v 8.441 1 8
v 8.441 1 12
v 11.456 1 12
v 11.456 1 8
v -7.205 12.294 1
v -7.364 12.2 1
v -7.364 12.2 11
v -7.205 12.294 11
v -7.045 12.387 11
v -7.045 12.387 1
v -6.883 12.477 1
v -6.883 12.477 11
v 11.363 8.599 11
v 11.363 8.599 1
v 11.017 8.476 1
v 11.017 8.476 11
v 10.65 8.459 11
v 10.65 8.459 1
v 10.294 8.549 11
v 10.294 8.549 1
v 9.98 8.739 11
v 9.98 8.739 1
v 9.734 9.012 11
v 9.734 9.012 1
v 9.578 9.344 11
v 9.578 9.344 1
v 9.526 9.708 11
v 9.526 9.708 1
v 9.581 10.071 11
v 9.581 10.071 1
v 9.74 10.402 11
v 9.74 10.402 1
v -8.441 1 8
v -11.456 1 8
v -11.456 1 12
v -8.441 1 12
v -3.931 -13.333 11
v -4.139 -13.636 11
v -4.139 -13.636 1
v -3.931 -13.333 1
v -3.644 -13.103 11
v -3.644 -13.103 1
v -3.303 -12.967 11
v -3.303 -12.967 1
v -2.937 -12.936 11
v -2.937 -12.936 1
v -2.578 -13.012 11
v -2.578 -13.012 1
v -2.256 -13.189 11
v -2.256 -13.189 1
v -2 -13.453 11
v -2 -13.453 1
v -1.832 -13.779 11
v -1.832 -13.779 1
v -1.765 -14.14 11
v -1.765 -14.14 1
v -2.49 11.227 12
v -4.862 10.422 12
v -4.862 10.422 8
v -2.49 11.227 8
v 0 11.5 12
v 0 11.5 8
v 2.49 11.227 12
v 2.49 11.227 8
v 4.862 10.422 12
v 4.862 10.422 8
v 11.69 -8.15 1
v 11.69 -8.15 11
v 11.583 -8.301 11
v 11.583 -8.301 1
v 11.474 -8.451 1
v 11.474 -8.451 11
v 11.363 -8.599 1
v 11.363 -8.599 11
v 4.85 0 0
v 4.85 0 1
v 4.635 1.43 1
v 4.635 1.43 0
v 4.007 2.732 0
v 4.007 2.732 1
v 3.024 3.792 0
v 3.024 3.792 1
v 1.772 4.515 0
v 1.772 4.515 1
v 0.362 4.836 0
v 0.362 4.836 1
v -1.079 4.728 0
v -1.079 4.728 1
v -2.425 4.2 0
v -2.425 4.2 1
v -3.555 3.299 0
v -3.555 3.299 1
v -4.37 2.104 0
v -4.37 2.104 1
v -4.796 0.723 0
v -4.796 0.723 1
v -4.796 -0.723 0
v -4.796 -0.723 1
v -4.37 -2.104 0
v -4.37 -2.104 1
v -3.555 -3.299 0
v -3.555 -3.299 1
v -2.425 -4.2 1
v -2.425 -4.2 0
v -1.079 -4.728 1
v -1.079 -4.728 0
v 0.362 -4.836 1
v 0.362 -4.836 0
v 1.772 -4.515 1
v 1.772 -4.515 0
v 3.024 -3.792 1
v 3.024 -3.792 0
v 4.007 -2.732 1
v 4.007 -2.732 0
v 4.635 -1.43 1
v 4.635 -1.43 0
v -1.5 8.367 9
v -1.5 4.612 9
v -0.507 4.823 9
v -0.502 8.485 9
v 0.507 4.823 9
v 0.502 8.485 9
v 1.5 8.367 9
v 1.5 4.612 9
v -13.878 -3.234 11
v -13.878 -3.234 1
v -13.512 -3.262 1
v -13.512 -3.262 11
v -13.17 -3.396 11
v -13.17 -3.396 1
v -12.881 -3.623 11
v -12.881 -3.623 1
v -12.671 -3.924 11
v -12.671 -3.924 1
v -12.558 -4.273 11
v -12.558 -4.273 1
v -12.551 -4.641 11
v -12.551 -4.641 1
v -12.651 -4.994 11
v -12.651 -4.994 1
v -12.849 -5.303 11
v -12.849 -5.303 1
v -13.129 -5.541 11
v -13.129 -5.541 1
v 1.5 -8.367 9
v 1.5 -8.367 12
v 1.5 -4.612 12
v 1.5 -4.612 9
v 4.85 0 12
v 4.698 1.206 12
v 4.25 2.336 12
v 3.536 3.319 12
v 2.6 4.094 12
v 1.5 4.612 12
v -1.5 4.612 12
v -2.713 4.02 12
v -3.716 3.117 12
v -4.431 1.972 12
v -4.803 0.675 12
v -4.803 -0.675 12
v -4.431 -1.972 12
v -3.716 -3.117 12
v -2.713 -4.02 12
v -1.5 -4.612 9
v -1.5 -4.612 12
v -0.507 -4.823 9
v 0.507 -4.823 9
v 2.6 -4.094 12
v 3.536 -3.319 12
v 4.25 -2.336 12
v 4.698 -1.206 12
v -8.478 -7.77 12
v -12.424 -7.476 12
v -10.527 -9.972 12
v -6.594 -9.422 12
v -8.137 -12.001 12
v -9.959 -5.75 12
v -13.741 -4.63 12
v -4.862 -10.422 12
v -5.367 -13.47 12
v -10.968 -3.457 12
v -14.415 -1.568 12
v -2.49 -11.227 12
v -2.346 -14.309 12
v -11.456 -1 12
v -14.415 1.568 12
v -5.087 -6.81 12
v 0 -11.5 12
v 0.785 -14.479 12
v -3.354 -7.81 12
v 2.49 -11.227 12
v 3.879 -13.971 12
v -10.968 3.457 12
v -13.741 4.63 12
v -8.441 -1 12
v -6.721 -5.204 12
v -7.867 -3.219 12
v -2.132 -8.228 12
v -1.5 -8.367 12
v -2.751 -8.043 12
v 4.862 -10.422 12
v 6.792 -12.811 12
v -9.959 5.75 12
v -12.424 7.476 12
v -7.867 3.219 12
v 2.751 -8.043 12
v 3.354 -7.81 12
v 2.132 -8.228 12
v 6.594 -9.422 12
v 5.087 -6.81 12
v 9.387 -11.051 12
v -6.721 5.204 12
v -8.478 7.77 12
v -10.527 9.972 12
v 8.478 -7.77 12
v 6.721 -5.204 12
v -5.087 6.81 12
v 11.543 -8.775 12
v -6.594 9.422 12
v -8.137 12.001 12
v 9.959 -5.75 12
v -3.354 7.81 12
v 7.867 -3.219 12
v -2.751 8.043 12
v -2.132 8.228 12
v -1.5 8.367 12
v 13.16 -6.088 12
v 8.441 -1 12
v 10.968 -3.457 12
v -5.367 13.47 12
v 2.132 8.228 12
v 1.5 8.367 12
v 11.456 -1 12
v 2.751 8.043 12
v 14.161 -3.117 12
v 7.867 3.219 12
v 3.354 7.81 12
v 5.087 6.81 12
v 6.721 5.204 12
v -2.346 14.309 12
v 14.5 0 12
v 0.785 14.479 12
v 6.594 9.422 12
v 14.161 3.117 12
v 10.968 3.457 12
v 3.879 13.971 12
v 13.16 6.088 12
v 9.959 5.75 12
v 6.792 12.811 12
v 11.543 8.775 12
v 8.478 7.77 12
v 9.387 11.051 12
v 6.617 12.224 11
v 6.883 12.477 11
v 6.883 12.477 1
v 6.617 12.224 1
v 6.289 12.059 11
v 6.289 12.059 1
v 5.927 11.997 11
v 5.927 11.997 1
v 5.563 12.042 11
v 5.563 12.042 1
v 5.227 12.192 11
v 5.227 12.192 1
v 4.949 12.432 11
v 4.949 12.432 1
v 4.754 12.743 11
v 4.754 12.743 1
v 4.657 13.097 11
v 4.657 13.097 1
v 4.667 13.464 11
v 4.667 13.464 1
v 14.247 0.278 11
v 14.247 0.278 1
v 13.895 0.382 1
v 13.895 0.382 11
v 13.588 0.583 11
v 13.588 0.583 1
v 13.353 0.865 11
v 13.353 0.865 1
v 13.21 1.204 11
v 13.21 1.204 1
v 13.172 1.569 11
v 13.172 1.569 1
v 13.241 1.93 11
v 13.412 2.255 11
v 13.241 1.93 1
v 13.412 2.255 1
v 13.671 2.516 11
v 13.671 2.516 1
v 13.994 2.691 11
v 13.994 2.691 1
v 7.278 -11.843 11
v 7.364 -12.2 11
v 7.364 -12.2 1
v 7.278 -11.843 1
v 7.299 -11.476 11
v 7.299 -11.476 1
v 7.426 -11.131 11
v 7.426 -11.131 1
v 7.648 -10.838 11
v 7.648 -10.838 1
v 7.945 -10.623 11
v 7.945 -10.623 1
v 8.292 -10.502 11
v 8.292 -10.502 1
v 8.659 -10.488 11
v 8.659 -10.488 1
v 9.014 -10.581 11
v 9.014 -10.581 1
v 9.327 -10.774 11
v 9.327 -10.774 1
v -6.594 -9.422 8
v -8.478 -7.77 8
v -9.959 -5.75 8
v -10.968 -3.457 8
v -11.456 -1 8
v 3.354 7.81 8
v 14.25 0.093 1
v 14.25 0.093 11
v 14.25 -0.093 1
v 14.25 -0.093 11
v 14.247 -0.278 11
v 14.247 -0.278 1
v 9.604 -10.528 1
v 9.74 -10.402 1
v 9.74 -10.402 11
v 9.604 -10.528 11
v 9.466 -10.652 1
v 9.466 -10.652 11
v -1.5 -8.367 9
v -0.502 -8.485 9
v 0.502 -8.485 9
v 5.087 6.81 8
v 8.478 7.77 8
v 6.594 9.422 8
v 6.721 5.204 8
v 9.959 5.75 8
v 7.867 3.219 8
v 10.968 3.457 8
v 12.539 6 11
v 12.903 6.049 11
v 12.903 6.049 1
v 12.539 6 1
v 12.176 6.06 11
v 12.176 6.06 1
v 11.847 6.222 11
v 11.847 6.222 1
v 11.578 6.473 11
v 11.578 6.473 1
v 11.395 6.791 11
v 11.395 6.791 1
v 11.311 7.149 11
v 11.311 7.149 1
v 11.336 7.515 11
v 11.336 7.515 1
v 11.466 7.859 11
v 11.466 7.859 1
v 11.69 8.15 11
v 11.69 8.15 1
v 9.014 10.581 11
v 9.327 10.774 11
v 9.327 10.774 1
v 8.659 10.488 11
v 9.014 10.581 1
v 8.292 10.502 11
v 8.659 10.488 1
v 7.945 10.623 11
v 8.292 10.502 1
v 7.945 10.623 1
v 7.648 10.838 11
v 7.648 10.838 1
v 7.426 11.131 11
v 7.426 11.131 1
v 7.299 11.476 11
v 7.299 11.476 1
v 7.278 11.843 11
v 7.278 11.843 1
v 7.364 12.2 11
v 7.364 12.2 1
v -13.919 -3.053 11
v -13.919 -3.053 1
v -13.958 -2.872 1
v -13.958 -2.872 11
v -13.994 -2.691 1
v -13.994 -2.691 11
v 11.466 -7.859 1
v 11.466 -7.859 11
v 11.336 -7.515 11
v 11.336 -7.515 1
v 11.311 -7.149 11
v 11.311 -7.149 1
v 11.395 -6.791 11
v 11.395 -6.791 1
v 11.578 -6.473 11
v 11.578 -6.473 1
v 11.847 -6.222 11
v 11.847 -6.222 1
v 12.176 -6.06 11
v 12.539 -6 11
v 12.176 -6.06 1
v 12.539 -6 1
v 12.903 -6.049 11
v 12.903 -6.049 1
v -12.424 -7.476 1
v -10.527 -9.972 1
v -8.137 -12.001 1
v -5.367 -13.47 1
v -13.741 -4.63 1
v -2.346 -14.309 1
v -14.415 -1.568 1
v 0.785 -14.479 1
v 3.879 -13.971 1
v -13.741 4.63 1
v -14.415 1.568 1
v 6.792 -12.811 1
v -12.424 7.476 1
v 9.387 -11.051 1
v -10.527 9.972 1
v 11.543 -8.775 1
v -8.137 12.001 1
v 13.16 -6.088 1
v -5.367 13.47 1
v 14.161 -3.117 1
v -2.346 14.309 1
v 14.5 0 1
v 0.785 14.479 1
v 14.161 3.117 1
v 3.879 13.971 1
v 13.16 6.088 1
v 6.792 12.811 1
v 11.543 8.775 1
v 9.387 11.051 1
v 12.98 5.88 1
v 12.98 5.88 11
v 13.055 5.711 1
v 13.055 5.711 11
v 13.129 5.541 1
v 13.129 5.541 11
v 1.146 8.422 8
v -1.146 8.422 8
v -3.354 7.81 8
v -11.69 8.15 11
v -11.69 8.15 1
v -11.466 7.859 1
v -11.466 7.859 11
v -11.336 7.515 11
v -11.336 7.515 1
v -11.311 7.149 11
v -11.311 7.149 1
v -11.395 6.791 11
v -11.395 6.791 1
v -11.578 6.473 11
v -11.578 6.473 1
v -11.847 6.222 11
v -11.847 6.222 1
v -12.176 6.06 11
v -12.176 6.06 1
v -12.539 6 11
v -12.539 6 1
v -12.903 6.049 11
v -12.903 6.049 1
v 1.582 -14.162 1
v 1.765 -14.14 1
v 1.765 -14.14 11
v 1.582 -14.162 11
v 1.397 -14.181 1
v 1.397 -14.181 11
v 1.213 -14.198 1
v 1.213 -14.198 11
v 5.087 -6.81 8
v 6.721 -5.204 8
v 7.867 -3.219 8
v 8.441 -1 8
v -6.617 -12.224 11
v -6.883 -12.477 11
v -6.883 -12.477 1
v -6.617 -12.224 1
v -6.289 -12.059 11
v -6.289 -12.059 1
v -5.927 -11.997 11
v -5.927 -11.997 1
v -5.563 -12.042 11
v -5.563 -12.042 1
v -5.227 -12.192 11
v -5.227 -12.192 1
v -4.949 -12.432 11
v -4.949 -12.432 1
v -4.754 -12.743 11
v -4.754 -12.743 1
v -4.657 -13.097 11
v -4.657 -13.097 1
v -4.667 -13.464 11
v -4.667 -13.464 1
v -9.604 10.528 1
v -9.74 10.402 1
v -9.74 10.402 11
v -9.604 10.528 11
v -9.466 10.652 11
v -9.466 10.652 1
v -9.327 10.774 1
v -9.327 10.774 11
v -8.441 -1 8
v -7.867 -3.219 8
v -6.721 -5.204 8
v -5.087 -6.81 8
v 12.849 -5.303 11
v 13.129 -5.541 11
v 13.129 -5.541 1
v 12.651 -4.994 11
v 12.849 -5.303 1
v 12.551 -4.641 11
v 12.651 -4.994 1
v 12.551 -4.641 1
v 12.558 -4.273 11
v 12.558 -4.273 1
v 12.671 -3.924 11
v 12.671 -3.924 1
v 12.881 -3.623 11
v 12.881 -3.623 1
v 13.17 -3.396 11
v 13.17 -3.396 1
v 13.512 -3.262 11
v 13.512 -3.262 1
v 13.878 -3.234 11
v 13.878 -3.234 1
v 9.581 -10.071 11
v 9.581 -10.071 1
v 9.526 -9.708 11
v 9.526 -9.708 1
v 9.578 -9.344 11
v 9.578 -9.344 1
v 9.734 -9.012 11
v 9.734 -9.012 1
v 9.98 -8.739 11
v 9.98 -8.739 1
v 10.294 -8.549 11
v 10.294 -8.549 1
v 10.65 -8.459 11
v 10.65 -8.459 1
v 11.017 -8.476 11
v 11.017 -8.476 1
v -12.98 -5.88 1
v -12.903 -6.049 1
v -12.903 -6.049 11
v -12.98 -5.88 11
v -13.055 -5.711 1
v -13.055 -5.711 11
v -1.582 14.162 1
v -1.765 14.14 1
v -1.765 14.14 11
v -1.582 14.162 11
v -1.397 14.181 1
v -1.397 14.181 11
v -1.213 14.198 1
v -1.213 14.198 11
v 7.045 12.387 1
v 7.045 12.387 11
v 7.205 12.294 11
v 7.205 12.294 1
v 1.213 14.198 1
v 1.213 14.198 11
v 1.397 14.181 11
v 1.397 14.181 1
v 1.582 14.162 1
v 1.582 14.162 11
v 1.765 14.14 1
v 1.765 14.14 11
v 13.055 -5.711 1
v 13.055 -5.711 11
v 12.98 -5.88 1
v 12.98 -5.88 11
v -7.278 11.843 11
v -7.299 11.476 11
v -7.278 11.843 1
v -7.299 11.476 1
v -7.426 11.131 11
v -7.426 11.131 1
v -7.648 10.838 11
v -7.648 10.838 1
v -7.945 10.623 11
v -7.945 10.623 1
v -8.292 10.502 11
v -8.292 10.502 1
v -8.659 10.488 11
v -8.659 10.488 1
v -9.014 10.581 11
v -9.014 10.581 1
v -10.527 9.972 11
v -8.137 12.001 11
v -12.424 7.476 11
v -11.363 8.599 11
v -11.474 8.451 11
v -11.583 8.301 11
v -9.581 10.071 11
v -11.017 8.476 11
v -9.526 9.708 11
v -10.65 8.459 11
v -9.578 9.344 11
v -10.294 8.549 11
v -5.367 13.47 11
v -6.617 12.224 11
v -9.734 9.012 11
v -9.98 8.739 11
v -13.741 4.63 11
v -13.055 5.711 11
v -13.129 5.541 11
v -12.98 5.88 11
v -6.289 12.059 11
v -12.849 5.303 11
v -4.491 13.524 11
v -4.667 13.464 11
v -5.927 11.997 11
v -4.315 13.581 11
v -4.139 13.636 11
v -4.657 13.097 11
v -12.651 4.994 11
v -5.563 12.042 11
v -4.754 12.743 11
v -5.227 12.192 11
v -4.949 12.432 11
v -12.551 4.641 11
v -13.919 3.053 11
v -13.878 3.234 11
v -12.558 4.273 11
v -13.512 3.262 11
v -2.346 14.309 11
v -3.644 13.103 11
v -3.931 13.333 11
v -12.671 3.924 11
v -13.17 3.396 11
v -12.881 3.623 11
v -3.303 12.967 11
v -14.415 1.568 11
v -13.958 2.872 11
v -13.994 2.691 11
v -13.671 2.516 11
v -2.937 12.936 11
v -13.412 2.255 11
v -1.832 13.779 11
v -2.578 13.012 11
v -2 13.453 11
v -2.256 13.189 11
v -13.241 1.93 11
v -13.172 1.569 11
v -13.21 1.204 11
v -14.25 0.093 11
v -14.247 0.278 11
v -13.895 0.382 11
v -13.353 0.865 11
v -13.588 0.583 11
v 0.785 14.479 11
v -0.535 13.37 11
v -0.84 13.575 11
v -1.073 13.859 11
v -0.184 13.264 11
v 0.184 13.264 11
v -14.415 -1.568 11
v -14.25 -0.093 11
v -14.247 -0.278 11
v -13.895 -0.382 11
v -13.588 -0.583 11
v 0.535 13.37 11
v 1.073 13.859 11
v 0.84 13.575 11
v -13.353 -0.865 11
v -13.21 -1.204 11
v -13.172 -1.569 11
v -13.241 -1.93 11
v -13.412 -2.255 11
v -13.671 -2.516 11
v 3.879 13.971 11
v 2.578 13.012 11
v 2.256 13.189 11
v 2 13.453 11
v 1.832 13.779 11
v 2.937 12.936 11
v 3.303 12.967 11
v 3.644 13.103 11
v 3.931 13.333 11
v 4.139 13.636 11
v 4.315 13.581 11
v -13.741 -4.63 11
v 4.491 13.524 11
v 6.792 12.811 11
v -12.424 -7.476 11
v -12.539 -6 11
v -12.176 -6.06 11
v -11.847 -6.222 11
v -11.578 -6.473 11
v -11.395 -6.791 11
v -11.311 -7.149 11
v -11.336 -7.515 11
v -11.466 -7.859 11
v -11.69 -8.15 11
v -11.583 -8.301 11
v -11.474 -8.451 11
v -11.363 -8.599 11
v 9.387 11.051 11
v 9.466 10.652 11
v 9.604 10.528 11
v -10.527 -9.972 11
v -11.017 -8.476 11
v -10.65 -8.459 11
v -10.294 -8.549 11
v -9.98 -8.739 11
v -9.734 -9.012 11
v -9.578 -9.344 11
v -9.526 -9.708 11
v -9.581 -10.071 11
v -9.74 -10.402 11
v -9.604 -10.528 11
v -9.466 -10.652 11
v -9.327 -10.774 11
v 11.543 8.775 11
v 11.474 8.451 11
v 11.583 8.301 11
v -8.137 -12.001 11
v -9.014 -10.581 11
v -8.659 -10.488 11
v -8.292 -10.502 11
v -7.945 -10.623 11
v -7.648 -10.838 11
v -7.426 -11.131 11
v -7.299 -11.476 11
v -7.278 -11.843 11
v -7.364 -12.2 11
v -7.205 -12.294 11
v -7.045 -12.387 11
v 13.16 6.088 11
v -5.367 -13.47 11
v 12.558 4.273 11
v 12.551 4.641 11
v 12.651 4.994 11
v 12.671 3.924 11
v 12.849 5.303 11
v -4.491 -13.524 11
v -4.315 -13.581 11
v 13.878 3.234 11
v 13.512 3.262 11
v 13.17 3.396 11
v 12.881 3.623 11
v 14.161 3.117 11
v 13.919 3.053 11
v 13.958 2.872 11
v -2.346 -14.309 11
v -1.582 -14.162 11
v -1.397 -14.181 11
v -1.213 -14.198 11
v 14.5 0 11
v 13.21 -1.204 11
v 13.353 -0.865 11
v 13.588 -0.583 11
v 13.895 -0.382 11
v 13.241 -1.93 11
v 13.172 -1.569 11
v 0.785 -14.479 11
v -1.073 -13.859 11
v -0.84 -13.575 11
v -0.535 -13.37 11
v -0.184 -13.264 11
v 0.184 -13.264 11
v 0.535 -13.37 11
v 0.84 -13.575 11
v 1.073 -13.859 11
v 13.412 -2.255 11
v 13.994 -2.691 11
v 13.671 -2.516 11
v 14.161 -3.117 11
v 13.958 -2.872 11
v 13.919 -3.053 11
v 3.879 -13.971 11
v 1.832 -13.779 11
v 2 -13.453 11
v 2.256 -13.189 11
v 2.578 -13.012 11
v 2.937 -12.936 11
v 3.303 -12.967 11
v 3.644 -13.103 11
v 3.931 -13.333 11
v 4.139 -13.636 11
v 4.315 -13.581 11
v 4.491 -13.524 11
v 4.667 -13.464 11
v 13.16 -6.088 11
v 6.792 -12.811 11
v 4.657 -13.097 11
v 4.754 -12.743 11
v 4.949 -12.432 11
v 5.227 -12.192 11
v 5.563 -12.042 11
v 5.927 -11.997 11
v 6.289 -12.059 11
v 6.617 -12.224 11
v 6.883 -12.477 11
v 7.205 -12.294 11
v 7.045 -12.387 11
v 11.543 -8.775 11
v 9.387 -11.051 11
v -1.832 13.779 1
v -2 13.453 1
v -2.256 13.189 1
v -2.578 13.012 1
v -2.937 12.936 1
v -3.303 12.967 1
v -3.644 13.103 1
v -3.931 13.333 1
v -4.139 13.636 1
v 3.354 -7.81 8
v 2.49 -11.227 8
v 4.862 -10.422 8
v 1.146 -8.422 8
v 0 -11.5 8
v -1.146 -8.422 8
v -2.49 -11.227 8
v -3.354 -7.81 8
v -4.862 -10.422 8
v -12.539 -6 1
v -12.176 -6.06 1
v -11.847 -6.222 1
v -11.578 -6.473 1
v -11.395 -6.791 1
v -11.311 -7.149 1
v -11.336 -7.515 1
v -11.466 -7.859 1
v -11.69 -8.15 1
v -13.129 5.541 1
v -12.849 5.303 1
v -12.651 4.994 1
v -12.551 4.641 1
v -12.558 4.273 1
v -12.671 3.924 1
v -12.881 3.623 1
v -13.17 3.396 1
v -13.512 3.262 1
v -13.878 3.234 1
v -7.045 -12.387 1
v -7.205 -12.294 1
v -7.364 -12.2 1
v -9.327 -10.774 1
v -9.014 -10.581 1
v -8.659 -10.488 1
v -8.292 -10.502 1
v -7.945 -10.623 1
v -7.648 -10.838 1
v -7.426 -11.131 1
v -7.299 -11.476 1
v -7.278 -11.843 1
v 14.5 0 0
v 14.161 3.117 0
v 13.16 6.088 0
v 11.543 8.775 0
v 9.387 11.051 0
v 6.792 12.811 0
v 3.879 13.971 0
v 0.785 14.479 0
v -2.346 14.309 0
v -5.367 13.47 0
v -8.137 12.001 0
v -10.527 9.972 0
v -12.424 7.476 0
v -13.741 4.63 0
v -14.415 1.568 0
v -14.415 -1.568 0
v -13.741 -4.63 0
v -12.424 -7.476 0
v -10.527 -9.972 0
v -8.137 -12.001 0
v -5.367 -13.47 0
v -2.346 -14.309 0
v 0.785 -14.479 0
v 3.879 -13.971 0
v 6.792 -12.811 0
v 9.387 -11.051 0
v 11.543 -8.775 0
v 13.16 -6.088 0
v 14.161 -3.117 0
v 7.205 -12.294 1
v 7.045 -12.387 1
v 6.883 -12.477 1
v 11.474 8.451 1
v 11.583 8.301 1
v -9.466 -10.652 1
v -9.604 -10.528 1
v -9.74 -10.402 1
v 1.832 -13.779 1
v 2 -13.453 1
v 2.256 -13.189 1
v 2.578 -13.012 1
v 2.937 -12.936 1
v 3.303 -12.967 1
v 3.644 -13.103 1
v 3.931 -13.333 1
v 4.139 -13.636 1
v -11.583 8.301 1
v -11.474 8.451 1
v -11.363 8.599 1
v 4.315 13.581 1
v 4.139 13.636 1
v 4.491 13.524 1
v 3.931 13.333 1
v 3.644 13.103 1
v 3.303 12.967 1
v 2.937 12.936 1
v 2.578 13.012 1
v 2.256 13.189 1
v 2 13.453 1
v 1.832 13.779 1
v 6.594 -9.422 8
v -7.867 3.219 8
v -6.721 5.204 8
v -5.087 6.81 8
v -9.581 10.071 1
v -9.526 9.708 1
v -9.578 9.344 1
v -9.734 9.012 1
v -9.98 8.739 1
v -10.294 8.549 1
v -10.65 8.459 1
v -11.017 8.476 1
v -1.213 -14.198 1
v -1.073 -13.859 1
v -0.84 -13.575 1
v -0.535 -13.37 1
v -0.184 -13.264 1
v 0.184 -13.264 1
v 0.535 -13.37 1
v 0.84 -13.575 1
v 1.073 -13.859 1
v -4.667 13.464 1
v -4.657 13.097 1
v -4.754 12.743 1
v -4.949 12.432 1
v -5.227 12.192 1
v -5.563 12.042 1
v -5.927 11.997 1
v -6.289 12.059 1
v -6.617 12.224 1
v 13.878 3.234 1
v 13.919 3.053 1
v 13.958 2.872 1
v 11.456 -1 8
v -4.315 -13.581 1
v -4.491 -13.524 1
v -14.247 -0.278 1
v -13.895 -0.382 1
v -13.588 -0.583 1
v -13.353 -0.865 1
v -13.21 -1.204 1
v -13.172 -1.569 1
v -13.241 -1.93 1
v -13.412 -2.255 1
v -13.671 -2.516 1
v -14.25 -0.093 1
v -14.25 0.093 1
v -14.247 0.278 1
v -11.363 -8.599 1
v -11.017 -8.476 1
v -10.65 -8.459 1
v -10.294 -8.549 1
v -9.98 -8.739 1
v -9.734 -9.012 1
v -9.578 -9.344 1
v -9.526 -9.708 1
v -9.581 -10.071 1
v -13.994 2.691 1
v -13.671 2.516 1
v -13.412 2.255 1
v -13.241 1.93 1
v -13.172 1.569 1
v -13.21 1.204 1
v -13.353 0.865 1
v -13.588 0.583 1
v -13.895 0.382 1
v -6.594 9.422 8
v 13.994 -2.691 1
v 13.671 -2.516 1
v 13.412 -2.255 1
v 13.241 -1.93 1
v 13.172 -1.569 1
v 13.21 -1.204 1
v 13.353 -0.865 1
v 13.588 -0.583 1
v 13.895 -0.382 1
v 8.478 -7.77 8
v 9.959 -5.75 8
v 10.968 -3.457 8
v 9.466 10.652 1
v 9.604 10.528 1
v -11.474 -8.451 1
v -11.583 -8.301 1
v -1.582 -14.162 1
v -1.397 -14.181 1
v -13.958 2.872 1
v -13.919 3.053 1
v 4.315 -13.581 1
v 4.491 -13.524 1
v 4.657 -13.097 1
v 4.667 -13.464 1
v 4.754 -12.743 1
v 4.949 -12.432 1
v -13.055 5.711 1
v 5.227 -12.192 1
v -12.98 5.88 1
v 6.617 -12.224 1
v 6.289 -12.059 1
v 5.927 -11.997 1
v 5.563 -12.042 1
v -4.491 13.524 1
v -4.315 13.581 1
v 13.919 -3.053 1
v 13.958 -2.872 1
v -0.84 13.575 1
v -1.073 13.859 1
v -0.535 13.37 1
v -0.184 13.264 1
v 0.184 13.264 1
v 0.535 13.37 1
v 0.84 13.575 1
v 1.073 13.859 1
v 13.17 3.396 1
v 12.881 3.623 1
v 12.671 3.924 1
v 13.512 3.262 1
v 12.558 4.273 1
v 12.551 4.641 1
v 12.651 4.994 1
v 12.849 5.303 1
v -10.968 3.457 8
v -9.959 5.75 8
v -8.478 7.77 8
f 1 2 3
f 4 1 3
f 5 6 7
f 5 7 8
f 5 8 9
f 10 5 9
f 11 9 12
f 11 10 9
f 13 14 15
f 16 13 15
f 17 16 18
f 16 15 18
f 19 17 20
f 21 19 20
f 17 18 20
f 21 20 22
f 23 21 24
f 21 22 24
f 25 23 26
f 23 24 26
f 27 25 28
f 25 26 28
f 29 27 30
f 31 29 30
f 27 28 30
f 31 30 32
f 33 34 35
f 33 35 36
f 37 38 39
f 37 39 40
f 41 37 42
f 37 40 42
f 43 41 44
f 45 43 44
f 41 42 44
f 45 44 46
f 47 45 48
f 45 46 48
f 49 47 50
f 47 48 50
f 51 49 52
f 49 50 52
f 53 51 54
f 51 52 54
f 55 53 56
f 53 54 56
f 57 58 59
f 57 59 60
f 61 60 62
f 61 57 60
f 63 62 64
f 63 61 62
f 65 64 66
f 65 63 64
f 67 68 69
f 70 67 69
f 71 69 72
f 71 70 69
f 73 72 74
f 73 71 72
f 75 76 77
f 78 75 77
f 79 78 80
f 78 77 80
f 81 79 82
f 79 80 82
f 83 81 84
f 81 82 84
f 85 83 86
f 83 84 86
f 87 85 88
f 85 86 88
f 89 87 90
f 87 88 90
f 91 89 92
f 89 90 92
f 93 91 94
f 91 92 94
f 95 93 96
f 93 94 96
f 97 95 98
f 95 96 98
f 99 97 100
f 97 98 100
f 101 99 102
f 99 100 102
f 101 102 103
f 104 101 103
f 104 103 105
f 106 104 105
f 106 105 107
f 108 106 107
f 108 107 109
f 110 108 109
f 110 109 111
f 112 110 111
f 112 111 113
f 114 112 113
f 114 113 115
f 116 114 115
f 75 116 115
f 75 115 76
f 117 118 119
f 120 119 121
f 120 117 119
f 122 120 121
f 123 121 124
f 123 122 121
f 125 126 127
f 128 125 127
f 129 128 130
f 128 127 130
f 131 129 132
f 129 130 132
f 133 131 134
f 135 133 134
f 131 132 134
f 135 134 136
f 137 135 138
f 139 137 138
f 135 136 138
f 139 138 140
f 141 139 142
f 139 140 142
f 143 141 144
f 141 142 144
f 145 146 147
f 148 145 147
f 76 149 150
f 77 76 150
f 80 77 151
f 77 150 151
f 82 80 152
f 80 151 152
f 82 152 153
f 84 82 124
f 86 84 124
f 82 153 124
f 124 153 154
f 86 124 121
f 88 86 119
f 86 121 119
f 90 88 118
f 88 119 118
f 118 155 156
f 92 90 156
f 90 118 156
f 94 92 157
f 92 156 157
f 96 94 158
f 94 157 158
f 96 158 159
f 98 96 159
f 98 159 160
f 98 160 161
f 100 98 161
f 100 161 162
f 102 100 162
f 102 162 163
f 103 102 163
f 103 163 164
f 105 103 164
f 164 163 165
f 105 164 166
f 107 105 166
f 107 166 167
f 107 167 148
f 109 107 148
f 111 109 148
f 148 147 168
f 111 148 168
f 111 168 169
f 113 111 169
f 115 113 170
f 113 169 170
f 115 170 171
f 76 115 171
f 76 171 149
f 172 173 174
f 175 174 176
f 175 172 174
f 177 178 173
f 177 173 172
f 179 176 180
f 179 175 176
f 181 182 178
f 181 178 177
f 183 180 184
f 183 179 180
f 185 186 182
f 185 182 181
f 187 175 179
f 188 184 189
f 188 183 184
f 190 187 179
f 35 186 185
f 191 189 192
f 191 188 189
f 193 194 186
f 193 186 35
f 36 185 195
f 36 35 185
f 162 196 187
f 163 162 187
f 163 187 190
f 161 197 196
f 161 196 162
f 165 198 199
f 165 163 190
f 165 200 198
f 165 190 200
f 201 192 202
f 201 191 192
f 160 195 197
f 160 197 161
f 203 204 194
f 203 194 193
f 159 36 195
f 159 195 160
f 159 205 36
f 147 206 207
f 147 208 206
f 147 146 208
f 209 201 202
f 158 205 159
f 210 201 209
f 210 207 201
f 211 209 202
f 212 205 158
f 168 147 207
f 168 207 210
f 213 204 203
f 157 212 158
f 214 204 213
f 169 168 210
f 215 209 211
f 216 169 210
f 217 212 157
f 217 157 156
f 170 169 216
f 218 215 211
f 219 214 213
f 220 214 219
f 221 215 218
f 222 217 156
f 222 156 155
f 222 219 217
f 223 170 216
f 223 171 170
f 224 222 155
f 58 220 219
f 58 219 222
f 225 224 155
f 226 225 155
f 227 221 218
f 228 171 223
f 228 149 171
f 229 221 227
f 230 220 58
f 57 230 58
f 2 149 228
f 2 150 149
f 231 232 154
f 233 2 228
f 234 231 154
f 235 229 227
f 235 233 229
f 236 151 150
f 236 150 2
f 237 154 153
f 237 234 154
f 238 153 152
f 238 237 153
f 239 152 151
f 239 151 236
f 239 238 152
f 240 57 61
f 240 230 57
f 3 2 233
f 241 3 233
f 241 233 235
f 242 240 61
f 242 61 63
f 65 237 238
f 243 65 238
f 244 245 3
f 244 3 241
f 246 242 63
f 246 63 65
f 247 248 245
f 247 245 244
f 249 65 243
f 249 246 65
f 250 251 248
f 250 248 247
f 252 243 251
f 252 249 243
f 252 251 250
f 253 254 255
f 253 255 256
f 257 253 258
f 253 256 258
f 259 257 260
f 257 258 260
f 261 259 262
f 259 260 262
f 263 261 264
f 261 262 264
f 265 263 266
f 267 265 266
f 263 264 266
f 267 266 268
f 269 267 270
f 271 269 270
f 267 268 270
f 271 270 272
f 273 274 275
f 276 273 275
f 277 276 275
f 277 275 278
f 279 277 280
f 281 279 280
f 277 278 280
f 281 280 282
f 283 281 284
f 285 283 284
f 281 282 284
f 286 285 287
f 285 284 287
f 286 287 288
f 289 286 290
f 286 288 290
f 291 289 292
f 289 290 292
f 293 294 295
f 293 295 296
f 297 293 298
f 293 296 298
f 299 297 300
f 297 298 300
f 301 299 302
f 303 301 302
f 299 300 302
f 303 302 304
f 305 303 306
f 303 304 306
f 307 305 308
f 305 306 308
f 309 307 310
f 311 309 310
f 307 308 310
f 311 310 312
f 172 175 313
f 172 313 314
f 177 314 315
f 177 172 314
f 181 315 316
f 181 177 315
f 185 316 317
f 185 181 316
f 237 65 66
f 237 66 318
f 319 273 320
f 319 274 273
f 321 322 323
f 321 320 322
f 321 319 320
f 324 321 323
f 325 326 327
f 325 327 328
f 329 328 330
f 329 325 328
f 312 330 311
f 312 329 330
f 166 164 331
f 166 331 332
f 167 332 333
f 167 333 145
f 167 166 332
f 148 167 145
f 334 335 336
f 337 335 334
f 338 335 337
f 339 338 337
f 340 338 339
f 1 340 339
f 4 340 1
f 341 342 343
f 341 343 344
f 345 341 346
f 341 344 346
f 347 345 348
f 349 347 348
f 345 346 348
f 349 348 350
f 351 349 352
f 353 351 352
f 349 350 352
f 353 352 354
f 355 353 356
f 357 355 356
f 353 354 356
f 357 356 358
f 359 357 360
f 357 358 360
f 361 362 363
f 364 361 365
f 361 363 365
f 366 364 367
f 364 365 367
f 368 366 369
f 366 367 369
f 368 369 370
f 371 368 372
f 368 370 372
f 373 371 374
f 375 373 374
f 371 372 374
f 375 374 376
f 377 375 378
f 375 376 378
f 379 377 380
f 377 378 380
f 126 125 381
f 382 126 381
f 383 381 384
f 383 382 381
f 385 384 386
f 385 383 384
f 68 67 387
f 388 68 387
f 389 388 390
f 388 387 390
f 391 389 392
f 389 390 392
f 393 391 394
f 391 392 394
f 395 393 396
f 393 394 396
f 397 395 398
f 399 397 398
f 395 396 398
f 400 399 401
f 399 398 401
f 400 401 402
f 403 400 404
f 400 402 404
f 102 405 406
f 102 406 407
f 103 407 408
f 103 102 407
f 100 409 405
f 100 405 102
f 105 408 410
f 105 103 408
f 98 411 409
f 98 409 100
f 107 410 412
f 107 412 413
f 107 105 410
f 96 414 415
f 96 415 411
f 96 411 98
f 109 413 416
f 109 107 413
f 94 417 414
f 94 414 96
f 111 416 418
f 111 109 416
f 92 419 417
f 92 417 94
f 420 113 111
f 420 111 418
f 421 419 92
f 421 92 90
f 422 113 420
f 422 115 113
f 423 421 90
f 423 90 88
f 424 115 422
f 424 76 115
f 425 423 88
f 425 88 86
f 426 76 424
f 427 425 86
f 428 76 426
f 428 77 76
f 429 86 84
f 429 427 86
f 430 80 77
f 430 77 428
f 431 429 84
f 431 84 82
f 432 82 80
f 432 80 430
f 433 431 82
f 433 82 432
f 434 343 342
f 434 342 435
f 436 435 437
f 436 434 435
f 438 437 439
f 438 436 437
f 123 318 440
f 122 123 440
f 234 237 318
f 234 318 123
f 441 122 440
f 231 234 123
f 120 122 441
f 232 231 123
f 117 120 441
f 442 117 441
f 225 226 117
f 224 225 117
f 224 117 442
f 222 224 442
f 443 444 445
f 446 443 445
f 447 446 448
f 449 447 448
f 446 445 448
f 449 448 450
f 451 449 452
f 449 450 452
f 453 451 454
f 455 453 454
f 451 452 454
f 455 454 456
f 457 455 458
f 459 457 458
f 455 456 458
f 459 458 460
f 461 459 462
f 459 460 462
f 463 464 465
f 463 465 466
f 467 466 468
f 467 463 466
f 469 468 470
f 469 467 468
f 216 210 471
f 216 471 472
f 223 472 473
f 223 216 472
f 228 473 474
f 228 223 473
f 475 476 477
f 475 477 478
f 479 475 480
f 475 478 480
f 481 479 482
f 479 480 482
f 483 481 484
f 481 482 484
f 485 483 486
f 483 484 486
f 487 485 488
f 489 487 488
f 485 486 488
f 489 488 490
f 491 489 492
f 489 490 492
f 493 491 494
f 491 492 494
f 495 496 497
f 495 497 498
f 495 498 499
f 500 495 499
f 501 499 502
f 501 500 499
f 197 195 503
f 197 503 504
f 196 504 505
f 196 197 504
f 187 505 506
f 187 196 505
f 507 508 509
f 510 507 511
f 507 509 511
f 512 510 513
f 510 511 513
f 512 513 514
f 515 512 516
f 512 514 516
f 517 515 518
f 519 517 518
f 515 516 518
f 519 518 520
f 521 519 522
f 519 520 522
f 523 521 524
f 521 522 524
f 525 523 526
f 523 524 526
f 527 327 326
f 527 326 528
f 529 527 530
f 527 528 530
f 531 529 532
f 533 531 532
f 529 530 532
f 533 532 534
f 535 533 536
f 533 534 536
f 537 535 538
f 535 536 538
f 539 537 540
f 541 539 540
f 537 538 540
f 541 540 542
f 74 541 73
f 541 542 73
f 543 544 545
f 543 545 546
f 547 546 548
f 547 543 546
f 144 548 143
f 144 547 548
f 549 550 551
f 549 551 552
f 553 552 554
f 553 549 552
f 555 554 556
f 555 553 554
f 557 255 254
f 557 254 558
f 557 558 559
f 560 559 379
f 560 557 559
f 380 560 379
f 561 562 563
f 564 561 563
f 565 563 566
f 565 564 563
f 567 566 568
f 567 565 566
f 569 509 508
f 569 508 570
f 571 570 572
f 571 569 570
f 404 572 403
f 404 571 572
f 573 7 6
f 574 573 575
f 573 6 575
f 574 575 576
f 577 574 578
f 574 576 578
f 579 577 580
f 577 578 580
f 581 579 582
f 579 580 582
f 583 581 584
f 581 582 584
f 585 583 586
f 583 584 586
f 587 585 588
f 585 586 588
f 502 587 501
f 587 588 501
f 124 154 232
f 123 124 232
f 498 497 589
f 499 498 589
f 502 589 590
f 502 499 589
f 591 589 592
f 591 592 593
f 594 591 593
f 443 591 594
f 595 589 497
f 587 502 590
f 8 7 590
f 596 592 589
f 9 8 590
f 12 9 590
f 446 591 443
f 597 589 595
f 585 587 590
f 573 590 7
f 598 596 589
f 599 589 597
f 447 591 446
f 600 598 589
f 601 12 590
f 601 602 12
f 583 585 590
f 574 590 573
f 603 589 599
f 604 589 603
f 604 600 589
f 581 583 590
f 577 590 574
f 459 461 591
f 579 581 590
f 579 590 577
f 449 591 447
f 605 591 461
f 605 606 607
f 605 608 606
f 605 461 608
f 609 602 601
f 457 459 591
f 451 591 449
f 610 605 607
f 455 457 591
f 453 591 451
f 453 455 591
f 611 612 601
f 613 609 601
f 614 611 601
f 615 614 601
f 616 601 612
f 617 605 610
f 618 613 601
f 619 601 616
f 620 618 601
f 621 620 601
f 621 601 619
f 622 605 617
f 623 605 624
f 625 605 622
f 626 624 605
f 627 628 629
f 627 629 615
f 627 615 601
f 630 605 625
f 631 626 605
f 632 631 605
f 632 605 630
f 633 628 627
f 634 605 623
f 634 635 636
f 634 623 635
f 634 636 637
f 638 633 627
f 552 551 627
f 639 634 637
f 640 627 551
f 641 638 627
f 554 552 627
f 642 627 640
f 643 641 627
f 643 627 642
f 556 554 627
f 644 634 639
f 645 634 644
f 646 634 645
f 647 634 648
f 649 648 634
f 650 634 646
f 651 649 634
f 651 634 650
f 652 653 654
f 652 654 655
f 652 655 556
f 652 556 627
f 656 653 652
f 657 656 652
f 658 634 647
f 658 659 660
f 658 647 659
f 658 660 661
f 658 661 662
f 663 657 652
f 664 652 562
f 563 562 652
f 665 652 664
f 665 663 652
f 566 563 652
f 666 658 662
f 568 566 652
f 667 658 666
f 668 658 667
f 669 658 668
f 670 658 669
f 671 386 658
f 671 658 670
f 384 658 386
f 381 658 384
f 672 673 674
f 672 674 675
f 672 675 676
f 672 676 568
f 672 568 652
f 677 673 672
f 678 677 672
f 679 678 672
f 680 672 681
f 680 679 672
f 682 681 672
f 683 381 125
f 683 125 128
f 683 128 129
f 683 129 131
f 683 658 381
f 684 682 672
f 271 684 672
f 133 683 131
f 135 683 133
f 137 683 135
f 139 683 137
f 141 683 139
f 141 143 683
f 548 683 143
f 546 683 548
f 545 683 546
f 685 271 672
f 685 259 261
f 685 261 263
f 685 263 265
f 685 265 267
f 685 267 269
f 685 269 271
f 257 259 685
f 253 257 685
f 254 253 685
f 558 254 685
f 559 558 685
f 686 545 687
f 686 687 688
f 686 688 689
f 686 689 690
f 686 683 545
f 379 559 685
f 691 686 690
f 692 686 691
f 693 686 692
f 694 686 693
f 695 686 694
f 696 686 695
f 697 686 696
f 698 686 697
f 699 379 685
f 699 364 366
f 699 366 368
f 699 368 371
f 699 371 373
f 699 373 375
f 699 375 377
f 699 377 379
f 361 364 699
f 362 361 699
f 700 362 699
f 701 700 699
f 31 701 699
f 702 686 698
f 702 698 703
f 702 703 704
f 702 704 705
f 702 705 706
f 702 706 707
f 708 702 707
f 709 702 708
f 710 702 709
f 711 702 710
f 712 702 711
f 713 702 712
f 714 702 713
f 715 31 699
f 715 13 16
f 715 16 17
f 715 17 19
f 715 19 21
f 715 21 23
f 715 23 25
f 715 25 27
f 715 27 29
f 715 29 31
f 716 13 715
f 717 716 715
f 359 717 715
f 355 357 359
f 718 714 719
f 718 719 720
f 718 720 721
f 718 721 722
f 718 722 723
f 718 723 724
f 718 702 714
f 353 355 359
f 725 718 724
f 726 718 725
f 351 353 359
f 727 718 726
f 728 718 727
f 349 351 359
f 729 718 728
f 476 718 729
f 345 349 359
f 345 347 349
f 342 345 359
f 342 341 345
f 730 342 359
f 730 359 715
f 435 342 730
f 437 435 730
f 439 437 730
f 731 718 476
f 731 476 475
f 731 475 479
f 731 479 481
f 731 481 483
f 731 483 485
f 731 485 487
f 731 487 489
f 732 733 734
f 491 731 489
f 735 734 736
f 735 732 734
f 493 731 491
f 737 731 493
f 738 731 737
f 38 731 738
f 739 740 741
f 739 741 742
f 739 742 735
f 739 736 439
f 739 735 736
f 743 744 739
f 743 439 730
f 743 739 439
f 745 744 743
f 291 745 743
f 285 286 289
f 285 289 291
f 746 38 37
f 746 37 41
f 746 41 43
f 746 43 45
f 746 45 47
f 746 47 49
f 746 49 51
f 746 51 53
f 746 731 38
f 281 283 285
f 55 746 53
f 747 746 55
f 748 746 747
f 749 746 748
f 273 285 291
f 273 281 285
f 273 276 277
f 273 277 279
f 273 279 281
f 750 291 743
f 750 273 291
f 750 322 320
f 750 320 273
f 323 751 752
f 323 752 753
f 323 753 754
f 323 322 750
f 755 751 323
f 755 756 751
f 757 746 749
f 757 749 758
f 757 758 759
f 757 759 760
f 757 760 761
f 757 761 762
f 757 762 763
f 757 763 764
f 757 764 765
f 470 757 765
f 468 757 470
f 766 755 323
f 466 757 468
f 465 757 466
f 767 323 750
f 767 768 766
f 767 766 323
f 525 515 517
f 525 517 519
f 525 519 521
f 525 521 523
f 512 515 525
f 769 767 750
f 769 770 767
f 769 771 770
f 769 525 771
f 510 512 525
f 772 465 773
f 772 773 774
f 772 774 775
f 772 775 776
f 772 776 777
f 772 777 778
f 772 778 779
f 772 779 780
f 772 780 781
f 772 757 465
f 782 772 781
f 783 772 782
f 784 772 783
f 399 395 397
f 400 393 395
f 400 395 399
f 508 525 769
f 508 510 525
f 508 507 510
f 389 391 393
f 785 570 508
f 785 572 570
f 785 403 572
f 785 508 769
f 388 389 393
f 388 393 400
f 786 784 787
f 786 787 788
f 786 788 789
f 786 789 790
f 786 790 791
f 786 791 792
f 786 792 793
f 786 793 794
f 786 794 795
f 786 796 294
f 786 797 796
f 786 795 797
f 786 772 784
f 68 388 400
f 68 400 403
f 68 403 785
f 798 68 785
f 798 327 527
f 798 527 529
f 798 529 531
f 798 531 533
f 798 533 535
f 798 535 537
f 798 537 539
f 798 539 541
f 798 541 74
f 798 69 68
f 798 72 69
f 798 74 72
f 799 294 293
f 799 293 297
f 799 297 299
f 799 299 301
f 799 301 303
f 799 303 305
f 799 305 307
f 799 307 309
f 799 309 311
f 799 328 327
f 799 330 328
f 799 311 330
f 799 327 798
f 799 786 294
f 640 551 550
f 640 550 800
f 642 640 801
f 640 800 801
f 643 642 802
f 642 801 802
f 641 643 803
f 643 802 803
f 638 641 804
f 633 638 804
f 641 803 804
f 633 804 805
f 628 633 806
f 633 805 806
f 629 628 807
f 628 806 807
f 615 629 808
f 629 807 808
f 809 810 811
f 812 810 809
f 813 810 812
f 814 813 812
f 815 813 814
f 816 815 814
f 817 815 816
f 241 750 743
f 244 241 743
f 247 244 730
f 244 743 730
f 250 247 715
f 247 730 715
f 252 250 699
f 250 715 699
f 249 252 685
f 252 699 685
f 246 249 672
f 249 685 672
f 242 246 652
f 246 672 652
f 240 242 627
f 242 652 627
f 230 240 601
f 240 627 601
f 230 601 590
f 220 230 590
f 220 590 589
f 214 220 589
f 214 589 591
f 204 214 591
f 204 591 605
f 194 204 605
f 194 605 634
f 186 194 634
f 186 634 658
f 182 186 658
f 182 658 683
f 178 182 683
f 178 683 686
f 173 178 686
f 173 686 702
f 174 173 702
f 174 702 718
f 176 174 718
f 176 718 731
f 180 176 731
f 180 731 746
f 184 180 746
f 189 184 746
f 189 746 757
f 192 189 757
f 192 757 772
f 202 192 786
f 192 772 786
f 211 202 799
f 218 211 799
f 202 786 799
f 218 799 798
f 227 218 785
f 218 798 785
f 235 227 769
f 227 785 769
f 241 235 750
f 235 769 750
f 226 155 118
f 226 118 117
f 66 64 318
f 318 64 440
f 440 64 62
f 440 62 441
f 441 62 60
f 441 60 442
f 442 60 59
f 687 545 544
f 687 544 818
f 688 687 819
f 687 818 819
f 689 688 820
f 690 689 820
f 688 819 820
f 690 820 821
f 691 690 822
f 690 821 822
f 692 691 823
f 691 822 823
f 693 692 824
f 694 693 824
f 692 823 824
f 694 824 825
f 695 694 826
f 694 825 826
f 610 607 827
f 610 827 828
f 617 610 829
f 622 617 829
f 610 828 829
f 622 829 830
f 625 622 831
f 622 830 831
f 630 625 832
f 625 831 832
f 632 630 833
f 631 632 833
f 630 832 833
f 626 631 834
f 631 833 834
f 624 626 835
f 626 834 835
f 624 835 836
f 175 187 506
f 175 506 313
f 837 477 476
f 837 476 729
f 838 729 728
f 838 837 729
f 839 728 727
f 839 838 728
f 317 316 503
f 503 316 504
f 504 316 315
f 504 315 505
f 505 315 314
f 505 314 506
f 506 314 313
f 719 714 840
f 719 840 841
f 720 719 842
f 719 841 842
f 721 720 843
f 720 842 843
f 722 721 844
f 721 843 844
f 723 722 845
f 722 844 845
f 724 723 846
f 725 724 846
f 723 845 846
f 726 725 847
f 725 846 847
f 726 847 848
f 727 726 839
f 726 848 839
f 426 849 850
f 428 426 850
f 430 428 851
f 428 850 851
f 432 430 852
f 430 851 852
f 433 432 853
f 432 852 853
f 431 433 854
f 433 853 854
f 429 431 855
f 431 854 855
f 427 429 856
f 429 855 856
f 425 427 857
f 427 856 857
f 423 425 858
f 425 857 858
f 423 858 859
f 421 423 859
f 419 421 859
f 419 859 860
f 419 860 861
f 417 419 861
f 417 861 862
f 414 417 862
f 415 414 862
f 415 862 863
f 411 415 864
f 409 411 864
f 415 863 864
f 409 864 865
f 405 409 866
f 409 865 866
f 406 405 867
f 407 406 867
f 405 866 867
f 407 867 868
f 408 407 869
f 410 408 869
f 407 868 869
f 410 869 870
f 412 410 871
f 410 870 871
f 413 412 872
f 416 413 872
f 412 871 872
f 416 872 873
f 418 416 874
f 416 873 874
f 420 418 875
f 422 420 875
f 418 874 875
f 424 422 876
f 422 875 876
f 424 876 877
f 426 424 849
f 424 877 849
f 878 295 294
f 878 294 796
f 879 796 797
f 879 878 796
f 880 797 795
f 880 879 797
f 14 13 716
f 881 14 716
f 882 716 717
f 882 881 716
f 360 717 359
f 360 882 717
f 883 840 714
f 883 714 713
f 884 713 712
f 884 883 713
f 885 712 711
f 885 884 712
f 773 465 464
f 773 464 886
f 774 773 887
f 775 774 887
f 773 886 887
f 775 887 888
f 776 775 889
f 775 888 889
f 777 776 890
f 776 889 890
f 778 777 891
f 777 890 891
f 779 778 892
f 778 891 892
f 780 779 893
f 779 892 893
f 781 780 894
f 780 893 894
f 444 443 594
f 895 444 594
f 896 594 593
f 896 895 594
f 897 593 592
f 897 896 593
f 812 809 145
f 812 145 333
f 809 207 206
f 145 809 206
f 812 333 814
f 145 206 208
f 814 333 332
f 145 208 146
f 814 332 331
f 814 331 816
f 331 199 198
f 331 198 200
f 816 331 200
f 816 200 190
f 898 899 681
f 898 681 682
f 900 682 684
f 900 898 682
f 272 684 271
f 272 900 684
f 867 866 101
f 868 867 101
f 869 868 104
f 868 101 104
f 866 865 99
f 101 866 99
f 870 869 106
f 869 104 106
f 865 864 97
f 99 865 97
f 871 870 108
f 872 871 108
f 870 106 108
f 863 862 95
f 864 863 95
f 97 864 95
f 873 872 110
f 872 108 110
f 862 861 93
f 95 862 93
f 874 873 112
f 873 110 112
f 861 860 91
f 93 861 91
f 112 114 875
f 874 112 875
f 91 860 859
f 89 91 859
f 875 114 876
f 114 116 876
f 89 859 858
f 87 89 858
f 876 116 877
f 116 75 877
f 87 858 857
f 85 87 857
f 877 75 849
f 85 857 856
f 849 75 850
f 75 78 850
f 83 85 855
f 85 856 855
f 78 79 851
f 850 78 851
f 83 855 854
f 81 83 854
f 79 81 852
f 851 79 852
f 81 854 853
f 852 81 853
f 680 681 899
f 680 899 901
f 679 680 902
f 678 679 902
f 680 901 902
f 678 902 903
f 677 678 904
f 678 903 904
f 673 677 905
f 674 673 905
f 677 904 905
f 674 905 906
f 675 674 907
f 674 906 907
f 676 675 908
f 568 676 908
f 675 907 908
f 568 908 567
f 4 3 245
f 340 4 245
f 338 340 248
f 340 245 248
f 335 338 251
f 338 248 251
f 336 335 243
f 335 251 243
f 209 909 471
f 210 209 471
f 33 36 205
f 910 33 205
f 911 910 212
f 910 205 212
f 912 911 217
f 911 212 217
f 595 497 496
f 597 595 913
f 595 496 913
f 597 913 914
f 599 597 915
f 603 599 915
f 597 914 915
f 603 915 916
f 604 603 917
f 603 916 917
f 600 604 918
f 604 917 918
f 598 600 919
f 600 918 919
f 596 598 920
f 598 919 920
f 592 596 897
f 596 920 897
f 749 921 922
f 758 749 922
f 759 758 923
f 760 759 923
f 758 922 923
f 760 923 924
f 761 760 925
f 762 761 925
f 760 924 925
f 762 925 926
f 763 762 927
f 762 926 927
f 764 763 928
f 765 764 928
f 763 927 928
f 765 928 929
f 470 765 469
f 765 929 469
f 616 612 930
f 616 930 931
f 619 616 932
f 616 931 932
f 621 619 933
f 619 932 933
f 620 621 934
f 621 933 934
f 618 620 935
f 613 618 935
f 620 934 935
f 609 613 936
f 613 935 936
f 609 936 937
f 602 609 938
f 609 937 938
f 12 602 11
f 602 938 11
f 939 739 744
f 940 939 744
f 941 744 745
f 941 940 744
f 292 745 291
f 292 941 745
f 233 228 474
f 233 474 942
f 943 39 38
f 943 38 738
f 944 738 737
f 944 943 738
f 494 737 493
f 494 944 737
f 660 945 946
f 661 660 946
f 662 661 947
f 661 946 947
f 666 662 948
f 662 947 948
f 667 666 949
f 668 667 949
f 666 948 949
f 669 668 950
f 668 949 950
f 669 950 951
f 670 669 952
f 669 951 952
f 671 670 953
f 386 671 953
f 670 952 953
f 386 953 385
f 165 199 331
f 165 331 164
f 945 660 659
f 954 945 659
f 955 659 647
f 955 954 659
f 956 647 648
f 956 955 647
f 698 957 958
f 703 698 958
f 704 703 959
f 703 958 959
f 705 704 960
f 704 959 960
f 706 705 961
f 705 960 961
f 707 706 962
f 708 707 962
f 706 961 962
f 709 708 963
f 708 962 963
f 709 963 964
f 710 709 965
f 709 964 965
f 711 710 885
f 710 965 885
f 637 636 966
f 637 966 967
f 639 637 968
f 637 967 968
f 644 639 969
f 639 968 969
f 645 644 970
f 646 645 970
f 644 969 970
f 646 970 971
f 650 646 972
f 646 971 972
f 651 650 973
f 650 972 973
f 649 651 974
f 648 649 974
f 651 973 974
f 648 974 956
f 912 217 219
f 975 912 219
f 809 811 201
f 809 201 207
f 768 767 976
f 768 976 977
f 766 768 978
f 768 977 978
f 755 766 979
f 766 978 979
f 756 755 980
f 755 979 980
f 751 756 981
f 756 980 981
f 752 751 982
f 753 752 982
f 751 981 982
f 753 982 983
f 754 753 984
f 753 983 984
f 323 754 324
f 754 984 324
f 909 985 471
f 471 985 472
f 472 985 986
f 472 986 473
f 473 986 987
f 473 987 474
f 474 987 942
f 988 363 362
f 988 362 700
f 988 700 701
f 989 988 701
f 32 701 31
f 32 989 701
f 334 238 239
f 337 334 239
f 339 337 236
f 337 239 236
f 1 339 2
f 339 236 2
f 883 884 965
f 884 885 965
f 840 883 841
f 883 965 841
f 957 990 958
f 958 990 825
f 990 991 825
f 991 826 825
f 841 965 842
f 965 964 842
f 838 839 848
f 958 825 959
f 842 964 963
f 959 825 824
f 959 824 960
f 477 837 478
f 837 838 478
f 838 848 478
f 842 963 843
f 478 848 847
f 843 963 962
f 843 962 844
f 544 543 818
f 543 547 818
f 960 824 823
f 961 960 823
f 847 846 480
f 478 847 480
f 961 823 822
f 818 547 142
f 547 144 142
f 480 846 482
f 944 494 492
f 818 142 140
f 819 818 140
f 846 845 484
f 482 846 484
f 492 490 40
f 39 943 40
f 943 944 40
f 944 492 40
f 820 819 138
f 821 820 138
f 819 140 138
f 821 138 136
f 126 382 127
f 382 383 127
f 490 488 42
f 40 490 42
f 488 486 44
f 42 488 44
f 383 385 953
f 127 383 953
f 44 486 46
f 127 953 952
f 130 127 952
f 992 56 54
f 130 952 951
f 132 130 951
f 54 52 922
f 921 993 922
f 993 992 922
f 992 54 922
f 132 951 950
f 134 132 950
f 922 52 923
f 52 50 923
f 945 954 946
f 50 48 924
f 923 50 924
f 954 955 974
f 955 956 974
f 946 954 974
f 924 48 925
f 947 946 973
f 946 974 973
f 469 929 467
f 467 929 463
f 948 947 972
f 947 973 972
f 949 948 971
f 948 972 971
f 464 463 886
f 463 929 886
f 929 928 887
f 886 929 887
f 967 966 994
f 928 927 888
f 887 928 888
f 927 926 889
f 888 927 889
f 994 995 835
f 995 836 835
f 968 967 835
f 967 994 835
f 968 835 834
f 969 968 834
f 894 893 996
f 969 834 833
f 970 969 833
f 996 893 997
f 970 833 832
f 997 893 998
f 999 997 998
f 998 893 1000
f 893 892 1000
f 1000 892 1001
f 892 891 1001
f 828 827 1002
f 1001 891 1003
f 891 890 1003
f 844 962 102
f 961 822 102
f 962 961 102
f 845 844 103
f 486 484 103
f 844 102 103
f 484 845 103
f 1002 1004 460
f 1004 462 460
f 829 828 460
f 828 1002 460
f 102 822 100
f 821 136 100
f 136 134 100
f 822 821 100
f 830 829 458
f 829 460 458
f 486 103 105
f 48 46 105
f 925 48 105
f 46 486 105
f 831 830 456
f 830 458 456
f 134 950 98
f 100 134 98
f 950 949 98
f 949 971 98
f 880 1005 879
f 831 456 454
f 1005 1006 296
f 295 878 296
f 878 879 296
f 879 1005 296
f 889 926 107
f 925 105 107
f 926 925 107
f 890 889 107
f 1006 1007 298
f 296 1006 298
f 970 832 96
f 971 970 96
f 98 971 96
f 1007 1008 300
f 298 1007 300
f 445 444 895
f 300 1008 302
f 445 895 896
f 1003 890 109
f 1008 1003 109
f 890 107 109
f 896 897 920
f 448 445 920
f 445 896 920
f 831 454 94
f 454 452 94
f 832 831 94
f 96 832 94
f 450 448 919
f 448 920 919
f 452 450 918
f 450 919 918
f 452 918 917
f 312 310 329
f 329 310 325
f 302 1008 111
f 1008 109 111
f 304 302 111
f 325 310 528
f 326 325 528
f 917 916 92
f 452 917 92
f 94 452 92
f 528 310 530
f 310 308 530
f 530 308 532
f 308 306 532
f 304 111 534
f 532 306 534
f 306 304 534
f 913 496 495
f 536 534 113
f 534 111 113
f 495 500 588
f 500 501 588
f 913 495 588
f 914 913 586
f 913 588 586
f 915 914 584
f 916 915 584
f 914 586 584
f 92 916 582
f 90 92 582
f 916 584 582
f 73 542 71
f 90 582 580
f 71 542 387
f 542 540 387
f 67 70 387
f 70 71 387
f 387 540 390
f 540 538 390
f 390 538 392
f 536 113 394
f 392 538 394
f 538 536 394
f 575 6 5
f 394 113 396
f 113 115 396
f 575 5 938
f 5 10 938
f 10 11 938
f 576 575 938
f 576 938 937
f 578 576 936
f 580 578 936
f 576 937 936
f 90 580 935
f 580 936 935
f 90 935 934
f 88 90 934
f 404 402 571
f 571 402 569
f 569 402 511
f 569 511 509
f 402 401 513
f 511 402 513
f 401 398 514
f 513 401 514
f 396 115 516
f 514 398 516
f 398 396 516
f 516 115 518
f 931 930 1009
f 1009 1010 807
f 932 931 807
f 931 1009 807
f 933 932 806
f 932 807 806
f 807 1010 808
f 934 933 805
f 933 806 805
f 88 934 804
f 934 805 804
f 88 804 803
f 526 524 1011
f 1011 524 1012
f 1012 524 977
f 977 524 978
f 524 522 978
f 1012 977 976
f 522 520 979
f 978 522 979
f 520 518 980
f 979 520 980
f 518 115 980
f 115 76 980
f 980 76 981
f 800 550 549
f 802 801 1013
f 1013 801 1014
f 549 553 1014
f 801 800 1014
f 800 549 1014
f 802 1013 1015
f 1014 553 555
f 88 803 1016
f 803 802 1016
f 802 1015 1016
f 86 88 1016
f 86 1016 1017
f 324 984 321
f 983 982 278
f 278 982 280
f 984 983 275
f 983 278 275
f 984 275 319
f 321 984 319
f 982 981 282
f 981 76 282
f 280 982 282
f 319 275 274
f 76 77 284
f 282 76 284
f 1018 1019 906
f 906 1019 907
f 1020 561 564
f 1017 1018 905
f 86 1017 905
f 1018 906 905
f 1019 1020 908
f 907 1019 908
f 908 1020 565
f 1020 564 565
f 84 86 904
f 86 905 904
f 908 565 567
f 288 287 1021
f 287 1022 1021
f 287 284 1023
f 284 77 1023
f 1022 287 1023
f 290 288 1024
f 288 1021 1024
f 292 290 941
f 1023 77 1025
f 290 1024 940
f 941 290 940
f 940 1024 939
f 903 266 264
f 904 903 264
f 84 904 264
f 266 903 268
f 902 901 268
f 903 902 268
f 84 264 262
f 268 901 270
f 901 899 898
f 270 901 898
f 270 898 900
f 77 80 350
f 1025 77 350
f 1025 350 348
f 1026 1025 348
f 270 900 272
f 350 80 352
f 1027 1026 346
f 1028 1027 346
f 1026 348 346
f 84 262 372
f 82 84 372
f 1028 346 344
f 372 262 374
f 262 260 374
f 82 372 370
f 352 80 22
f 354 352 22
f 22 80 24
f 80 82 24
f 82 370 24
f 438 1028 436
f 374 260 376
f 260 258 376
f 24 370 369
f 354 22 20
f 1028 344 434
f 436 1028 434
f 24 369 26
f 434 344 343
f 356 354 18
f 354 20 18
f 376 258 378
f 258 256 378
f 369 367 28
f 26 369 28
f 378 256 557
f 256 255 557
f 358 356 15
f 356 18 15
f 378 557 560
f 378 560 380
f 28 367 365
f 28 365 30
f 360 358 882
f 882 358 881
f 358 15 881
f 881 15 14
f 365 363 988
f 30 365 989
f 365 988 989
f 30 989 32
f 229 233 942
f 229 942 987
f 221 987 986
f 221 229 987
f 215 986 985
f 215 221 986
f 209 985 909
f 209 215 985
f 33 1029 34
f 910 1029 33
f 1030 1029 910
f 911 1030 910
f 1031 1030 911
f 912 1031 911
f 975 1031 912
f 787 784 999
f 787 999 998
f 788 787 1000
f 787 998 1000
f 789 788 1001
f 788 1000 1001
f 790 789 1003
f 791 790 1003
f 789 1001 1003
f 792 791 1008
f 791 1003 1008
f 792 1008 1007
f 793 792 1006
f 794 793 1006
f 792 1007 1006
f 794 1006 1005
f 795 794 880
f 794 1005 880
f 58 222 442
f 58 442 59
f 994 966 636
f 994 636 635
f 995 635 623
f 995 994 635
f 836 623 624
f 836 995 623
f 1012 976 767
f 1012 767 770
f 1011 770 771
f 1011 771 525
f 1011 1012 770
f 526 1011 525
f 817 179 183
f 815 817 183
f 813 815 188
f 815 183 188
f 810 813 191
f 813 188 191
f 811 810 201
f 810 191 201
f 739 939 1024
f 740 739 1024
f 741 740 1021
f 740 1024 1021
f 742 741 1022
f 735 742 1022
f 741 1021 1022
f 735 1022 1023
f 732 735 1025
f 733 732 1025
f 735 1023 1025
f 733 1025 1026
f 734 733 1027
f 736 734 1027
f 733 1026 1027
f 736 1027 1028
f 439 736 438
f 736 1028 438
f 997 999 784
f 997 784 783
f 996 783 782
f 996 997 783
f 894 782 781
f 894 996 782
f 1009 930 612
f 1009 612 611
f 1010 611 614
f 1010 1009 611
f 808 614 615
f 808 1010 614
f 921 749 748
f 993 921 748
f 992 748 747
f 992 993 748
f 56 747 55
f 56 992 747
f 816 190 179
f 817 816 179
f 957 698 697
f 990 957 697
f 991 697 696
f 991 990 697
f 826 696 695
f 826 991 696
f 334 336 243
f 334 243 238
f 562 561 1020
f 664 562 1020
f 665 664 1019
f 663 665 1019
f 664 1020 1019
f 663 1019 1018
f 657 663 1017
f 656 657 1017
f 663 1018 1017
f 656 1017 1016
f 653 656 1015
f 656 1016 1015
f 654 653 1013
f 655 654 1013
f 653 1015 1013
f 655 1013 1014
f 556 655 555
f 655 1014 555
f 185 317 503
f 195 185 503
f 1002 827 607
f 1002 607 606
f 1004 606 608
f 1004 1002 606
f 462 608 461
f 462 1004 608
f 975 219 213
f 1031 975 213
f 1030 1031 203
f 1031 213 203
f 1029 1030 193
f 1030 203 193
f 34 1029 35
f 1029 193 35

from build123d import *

# Parameters (mm, degrees)
F0_R            = 14.5
F1_DEPTH        = 1
F2_R            = 14.5
F3_DEPTH        = 11
F4_R            = 1.25
F5_DEPTH        = 10
F5_COPIES_COUNT = 30
F6_R            = 14.5
F6_R_2          = 14.25
F7_DEPTH        = 10
F9_DEPTH        = 4
F9_COPIES_COUNT = 3
F10_R           = 4.85
F11_DEPTH       = 12.001
F12_W           = 3
F12_H           = 18.4240331947
F13_DEPTH       = 3


# Not quite as in the source:
# - a pattern or mirror of a feature is missing from the dataset's text; its kind, count and spacing are read off the source's solid


with BuildPart() as f1:
    # F0 (on Top) → F1 (new body)
    with BuildSketch(Plane.XY):
        Circle(F0_R)
    extrude(amount=F1_DEPTH)


with BuildPart() as f3:
    # F2 (on face) → F3 (new body)
    with BuildSketch(Plane.XY.offset(1)):
        Circle(F2_R)
    extrude(amount=F3_DEPTH)

    # F4 (on face) → F5 (cut)
    with BuildSketch(Plane(origin=(0, 0, 1), x_dir=(1, 0, 0), z_dir=(0, 0, -1))):
        with Locations((0, -14.5)):
            Circle(F4_R)
    f5 = extrude(amount=-F5_DEPTH, mode=Mode.SUBTRACT)

    # F5_copies: F5 ×30 about axis
    f5_copies_axis = Axis((0, 0, 0), (0, 0, 1))
    for i in range(1, F5_COPIES_COUNT):
        add(f5.rotate(f5_copies_axis, i * 360 / F5_COPIES_COUNT), mode=Mode.SUBTRACT)

    # F6 (on face) → F7 (cut)
    with BuildSketch(Plane(origin=(0, 0, 1), x_dir=(1, 0, 0), z_dir=(0, 0, -1))):
        Circle(F6_R)
        Circle(F6_R_2, mode=Mode.SUBTRACT)
    extrude(amount=-F7_DEPTH, mode=Mode.SUBTRACT)

    # F8 (on face) → F9 (cut)
    with BuildSketch(Plane.XY.offset(12)):
        with BuildLine():
            Line((-5.0865111578, 6.8100957586), (-6.5942450225, 9.4215674165))
            ThreePointArc((-6.5942450225, 9.4215674165), (-9.9592921435, 5.75), (-11.4564392374, 1))
            Line((-11.4564392374, 1), (-8.4409715081, 1))
            ThreePointArc((-8.4409715081, 1), (-7.3612159322, 4.25), (-5.0865111578, 6.8100957586))
        make_face()
    f9 = extrude(amount=-F9_DEPTH, mode=Mode.SUBTRACT)

    # F9_copies: F9 ×3 about axis
    f9_copies_axis = Axis((0, 0, 0), (0, 0, 1))
    for i in range(1, F9_COPIES_COUNT):
        add(f9.rotate(f9_copies_axis, i * 360 / F9_COPIES_COUNT), mode=Mode.SUBTRACT)

    # F9_copies1: F9 across plane
    add(f9.mirror(Plane(origin=(0, 0, 0), x_dir=(0.5, 0.8660254038, 0), z_dir=(0.8660254038, -0.5, 0))), mode=Mode.SUBTRACT)

    # F9_copies2: F9 across plane
    add(f9.mirror(Plane(origin=(0, 0, 0), x_dir=(0, 0, -1), z_dir=(0, -1, 0))), mode=Mode.SUBTRACT)

    # F9_copies3: F9 across plane
    add(f9.mirror(Plane(origin=(0, 0, 0), x_dir=(-0.5, 0.8660254038, 0), z_dir=(0.8660254038, 0.5, 0))), mode=Mode.SUBTRACT)


with BuildPart() as f11_tool:
    # F10 (on face) → F11 (new body, through all)
    with BuildSketch(Plane.XY.offset(12)):
        Circle(F10_R)
    extrude(amount=-F11_DEPTH)


with BuildPart() as f1_1:
    add(f1.part)

    # F11: cut by f11_tool
    add(f11_tool.part, mode=Mode.SUBTRACT)


with BuildPart() as f3_1:
    add(f3.part)

    # F11: cut by f11_tool
    add(f11_tool.part, mode=Mode.SUBTRACT)

    # F12 (on face) → F13 (cut)
    with BuildSketch(Plane.XY.offset(12)):
        Rectangle(F12_W, F12_H)
    extrude(amount=-F13_DEPTH, mode=Mode.SUBTRACT)


solid = Compound([f1_1.part, f3_1.part])
